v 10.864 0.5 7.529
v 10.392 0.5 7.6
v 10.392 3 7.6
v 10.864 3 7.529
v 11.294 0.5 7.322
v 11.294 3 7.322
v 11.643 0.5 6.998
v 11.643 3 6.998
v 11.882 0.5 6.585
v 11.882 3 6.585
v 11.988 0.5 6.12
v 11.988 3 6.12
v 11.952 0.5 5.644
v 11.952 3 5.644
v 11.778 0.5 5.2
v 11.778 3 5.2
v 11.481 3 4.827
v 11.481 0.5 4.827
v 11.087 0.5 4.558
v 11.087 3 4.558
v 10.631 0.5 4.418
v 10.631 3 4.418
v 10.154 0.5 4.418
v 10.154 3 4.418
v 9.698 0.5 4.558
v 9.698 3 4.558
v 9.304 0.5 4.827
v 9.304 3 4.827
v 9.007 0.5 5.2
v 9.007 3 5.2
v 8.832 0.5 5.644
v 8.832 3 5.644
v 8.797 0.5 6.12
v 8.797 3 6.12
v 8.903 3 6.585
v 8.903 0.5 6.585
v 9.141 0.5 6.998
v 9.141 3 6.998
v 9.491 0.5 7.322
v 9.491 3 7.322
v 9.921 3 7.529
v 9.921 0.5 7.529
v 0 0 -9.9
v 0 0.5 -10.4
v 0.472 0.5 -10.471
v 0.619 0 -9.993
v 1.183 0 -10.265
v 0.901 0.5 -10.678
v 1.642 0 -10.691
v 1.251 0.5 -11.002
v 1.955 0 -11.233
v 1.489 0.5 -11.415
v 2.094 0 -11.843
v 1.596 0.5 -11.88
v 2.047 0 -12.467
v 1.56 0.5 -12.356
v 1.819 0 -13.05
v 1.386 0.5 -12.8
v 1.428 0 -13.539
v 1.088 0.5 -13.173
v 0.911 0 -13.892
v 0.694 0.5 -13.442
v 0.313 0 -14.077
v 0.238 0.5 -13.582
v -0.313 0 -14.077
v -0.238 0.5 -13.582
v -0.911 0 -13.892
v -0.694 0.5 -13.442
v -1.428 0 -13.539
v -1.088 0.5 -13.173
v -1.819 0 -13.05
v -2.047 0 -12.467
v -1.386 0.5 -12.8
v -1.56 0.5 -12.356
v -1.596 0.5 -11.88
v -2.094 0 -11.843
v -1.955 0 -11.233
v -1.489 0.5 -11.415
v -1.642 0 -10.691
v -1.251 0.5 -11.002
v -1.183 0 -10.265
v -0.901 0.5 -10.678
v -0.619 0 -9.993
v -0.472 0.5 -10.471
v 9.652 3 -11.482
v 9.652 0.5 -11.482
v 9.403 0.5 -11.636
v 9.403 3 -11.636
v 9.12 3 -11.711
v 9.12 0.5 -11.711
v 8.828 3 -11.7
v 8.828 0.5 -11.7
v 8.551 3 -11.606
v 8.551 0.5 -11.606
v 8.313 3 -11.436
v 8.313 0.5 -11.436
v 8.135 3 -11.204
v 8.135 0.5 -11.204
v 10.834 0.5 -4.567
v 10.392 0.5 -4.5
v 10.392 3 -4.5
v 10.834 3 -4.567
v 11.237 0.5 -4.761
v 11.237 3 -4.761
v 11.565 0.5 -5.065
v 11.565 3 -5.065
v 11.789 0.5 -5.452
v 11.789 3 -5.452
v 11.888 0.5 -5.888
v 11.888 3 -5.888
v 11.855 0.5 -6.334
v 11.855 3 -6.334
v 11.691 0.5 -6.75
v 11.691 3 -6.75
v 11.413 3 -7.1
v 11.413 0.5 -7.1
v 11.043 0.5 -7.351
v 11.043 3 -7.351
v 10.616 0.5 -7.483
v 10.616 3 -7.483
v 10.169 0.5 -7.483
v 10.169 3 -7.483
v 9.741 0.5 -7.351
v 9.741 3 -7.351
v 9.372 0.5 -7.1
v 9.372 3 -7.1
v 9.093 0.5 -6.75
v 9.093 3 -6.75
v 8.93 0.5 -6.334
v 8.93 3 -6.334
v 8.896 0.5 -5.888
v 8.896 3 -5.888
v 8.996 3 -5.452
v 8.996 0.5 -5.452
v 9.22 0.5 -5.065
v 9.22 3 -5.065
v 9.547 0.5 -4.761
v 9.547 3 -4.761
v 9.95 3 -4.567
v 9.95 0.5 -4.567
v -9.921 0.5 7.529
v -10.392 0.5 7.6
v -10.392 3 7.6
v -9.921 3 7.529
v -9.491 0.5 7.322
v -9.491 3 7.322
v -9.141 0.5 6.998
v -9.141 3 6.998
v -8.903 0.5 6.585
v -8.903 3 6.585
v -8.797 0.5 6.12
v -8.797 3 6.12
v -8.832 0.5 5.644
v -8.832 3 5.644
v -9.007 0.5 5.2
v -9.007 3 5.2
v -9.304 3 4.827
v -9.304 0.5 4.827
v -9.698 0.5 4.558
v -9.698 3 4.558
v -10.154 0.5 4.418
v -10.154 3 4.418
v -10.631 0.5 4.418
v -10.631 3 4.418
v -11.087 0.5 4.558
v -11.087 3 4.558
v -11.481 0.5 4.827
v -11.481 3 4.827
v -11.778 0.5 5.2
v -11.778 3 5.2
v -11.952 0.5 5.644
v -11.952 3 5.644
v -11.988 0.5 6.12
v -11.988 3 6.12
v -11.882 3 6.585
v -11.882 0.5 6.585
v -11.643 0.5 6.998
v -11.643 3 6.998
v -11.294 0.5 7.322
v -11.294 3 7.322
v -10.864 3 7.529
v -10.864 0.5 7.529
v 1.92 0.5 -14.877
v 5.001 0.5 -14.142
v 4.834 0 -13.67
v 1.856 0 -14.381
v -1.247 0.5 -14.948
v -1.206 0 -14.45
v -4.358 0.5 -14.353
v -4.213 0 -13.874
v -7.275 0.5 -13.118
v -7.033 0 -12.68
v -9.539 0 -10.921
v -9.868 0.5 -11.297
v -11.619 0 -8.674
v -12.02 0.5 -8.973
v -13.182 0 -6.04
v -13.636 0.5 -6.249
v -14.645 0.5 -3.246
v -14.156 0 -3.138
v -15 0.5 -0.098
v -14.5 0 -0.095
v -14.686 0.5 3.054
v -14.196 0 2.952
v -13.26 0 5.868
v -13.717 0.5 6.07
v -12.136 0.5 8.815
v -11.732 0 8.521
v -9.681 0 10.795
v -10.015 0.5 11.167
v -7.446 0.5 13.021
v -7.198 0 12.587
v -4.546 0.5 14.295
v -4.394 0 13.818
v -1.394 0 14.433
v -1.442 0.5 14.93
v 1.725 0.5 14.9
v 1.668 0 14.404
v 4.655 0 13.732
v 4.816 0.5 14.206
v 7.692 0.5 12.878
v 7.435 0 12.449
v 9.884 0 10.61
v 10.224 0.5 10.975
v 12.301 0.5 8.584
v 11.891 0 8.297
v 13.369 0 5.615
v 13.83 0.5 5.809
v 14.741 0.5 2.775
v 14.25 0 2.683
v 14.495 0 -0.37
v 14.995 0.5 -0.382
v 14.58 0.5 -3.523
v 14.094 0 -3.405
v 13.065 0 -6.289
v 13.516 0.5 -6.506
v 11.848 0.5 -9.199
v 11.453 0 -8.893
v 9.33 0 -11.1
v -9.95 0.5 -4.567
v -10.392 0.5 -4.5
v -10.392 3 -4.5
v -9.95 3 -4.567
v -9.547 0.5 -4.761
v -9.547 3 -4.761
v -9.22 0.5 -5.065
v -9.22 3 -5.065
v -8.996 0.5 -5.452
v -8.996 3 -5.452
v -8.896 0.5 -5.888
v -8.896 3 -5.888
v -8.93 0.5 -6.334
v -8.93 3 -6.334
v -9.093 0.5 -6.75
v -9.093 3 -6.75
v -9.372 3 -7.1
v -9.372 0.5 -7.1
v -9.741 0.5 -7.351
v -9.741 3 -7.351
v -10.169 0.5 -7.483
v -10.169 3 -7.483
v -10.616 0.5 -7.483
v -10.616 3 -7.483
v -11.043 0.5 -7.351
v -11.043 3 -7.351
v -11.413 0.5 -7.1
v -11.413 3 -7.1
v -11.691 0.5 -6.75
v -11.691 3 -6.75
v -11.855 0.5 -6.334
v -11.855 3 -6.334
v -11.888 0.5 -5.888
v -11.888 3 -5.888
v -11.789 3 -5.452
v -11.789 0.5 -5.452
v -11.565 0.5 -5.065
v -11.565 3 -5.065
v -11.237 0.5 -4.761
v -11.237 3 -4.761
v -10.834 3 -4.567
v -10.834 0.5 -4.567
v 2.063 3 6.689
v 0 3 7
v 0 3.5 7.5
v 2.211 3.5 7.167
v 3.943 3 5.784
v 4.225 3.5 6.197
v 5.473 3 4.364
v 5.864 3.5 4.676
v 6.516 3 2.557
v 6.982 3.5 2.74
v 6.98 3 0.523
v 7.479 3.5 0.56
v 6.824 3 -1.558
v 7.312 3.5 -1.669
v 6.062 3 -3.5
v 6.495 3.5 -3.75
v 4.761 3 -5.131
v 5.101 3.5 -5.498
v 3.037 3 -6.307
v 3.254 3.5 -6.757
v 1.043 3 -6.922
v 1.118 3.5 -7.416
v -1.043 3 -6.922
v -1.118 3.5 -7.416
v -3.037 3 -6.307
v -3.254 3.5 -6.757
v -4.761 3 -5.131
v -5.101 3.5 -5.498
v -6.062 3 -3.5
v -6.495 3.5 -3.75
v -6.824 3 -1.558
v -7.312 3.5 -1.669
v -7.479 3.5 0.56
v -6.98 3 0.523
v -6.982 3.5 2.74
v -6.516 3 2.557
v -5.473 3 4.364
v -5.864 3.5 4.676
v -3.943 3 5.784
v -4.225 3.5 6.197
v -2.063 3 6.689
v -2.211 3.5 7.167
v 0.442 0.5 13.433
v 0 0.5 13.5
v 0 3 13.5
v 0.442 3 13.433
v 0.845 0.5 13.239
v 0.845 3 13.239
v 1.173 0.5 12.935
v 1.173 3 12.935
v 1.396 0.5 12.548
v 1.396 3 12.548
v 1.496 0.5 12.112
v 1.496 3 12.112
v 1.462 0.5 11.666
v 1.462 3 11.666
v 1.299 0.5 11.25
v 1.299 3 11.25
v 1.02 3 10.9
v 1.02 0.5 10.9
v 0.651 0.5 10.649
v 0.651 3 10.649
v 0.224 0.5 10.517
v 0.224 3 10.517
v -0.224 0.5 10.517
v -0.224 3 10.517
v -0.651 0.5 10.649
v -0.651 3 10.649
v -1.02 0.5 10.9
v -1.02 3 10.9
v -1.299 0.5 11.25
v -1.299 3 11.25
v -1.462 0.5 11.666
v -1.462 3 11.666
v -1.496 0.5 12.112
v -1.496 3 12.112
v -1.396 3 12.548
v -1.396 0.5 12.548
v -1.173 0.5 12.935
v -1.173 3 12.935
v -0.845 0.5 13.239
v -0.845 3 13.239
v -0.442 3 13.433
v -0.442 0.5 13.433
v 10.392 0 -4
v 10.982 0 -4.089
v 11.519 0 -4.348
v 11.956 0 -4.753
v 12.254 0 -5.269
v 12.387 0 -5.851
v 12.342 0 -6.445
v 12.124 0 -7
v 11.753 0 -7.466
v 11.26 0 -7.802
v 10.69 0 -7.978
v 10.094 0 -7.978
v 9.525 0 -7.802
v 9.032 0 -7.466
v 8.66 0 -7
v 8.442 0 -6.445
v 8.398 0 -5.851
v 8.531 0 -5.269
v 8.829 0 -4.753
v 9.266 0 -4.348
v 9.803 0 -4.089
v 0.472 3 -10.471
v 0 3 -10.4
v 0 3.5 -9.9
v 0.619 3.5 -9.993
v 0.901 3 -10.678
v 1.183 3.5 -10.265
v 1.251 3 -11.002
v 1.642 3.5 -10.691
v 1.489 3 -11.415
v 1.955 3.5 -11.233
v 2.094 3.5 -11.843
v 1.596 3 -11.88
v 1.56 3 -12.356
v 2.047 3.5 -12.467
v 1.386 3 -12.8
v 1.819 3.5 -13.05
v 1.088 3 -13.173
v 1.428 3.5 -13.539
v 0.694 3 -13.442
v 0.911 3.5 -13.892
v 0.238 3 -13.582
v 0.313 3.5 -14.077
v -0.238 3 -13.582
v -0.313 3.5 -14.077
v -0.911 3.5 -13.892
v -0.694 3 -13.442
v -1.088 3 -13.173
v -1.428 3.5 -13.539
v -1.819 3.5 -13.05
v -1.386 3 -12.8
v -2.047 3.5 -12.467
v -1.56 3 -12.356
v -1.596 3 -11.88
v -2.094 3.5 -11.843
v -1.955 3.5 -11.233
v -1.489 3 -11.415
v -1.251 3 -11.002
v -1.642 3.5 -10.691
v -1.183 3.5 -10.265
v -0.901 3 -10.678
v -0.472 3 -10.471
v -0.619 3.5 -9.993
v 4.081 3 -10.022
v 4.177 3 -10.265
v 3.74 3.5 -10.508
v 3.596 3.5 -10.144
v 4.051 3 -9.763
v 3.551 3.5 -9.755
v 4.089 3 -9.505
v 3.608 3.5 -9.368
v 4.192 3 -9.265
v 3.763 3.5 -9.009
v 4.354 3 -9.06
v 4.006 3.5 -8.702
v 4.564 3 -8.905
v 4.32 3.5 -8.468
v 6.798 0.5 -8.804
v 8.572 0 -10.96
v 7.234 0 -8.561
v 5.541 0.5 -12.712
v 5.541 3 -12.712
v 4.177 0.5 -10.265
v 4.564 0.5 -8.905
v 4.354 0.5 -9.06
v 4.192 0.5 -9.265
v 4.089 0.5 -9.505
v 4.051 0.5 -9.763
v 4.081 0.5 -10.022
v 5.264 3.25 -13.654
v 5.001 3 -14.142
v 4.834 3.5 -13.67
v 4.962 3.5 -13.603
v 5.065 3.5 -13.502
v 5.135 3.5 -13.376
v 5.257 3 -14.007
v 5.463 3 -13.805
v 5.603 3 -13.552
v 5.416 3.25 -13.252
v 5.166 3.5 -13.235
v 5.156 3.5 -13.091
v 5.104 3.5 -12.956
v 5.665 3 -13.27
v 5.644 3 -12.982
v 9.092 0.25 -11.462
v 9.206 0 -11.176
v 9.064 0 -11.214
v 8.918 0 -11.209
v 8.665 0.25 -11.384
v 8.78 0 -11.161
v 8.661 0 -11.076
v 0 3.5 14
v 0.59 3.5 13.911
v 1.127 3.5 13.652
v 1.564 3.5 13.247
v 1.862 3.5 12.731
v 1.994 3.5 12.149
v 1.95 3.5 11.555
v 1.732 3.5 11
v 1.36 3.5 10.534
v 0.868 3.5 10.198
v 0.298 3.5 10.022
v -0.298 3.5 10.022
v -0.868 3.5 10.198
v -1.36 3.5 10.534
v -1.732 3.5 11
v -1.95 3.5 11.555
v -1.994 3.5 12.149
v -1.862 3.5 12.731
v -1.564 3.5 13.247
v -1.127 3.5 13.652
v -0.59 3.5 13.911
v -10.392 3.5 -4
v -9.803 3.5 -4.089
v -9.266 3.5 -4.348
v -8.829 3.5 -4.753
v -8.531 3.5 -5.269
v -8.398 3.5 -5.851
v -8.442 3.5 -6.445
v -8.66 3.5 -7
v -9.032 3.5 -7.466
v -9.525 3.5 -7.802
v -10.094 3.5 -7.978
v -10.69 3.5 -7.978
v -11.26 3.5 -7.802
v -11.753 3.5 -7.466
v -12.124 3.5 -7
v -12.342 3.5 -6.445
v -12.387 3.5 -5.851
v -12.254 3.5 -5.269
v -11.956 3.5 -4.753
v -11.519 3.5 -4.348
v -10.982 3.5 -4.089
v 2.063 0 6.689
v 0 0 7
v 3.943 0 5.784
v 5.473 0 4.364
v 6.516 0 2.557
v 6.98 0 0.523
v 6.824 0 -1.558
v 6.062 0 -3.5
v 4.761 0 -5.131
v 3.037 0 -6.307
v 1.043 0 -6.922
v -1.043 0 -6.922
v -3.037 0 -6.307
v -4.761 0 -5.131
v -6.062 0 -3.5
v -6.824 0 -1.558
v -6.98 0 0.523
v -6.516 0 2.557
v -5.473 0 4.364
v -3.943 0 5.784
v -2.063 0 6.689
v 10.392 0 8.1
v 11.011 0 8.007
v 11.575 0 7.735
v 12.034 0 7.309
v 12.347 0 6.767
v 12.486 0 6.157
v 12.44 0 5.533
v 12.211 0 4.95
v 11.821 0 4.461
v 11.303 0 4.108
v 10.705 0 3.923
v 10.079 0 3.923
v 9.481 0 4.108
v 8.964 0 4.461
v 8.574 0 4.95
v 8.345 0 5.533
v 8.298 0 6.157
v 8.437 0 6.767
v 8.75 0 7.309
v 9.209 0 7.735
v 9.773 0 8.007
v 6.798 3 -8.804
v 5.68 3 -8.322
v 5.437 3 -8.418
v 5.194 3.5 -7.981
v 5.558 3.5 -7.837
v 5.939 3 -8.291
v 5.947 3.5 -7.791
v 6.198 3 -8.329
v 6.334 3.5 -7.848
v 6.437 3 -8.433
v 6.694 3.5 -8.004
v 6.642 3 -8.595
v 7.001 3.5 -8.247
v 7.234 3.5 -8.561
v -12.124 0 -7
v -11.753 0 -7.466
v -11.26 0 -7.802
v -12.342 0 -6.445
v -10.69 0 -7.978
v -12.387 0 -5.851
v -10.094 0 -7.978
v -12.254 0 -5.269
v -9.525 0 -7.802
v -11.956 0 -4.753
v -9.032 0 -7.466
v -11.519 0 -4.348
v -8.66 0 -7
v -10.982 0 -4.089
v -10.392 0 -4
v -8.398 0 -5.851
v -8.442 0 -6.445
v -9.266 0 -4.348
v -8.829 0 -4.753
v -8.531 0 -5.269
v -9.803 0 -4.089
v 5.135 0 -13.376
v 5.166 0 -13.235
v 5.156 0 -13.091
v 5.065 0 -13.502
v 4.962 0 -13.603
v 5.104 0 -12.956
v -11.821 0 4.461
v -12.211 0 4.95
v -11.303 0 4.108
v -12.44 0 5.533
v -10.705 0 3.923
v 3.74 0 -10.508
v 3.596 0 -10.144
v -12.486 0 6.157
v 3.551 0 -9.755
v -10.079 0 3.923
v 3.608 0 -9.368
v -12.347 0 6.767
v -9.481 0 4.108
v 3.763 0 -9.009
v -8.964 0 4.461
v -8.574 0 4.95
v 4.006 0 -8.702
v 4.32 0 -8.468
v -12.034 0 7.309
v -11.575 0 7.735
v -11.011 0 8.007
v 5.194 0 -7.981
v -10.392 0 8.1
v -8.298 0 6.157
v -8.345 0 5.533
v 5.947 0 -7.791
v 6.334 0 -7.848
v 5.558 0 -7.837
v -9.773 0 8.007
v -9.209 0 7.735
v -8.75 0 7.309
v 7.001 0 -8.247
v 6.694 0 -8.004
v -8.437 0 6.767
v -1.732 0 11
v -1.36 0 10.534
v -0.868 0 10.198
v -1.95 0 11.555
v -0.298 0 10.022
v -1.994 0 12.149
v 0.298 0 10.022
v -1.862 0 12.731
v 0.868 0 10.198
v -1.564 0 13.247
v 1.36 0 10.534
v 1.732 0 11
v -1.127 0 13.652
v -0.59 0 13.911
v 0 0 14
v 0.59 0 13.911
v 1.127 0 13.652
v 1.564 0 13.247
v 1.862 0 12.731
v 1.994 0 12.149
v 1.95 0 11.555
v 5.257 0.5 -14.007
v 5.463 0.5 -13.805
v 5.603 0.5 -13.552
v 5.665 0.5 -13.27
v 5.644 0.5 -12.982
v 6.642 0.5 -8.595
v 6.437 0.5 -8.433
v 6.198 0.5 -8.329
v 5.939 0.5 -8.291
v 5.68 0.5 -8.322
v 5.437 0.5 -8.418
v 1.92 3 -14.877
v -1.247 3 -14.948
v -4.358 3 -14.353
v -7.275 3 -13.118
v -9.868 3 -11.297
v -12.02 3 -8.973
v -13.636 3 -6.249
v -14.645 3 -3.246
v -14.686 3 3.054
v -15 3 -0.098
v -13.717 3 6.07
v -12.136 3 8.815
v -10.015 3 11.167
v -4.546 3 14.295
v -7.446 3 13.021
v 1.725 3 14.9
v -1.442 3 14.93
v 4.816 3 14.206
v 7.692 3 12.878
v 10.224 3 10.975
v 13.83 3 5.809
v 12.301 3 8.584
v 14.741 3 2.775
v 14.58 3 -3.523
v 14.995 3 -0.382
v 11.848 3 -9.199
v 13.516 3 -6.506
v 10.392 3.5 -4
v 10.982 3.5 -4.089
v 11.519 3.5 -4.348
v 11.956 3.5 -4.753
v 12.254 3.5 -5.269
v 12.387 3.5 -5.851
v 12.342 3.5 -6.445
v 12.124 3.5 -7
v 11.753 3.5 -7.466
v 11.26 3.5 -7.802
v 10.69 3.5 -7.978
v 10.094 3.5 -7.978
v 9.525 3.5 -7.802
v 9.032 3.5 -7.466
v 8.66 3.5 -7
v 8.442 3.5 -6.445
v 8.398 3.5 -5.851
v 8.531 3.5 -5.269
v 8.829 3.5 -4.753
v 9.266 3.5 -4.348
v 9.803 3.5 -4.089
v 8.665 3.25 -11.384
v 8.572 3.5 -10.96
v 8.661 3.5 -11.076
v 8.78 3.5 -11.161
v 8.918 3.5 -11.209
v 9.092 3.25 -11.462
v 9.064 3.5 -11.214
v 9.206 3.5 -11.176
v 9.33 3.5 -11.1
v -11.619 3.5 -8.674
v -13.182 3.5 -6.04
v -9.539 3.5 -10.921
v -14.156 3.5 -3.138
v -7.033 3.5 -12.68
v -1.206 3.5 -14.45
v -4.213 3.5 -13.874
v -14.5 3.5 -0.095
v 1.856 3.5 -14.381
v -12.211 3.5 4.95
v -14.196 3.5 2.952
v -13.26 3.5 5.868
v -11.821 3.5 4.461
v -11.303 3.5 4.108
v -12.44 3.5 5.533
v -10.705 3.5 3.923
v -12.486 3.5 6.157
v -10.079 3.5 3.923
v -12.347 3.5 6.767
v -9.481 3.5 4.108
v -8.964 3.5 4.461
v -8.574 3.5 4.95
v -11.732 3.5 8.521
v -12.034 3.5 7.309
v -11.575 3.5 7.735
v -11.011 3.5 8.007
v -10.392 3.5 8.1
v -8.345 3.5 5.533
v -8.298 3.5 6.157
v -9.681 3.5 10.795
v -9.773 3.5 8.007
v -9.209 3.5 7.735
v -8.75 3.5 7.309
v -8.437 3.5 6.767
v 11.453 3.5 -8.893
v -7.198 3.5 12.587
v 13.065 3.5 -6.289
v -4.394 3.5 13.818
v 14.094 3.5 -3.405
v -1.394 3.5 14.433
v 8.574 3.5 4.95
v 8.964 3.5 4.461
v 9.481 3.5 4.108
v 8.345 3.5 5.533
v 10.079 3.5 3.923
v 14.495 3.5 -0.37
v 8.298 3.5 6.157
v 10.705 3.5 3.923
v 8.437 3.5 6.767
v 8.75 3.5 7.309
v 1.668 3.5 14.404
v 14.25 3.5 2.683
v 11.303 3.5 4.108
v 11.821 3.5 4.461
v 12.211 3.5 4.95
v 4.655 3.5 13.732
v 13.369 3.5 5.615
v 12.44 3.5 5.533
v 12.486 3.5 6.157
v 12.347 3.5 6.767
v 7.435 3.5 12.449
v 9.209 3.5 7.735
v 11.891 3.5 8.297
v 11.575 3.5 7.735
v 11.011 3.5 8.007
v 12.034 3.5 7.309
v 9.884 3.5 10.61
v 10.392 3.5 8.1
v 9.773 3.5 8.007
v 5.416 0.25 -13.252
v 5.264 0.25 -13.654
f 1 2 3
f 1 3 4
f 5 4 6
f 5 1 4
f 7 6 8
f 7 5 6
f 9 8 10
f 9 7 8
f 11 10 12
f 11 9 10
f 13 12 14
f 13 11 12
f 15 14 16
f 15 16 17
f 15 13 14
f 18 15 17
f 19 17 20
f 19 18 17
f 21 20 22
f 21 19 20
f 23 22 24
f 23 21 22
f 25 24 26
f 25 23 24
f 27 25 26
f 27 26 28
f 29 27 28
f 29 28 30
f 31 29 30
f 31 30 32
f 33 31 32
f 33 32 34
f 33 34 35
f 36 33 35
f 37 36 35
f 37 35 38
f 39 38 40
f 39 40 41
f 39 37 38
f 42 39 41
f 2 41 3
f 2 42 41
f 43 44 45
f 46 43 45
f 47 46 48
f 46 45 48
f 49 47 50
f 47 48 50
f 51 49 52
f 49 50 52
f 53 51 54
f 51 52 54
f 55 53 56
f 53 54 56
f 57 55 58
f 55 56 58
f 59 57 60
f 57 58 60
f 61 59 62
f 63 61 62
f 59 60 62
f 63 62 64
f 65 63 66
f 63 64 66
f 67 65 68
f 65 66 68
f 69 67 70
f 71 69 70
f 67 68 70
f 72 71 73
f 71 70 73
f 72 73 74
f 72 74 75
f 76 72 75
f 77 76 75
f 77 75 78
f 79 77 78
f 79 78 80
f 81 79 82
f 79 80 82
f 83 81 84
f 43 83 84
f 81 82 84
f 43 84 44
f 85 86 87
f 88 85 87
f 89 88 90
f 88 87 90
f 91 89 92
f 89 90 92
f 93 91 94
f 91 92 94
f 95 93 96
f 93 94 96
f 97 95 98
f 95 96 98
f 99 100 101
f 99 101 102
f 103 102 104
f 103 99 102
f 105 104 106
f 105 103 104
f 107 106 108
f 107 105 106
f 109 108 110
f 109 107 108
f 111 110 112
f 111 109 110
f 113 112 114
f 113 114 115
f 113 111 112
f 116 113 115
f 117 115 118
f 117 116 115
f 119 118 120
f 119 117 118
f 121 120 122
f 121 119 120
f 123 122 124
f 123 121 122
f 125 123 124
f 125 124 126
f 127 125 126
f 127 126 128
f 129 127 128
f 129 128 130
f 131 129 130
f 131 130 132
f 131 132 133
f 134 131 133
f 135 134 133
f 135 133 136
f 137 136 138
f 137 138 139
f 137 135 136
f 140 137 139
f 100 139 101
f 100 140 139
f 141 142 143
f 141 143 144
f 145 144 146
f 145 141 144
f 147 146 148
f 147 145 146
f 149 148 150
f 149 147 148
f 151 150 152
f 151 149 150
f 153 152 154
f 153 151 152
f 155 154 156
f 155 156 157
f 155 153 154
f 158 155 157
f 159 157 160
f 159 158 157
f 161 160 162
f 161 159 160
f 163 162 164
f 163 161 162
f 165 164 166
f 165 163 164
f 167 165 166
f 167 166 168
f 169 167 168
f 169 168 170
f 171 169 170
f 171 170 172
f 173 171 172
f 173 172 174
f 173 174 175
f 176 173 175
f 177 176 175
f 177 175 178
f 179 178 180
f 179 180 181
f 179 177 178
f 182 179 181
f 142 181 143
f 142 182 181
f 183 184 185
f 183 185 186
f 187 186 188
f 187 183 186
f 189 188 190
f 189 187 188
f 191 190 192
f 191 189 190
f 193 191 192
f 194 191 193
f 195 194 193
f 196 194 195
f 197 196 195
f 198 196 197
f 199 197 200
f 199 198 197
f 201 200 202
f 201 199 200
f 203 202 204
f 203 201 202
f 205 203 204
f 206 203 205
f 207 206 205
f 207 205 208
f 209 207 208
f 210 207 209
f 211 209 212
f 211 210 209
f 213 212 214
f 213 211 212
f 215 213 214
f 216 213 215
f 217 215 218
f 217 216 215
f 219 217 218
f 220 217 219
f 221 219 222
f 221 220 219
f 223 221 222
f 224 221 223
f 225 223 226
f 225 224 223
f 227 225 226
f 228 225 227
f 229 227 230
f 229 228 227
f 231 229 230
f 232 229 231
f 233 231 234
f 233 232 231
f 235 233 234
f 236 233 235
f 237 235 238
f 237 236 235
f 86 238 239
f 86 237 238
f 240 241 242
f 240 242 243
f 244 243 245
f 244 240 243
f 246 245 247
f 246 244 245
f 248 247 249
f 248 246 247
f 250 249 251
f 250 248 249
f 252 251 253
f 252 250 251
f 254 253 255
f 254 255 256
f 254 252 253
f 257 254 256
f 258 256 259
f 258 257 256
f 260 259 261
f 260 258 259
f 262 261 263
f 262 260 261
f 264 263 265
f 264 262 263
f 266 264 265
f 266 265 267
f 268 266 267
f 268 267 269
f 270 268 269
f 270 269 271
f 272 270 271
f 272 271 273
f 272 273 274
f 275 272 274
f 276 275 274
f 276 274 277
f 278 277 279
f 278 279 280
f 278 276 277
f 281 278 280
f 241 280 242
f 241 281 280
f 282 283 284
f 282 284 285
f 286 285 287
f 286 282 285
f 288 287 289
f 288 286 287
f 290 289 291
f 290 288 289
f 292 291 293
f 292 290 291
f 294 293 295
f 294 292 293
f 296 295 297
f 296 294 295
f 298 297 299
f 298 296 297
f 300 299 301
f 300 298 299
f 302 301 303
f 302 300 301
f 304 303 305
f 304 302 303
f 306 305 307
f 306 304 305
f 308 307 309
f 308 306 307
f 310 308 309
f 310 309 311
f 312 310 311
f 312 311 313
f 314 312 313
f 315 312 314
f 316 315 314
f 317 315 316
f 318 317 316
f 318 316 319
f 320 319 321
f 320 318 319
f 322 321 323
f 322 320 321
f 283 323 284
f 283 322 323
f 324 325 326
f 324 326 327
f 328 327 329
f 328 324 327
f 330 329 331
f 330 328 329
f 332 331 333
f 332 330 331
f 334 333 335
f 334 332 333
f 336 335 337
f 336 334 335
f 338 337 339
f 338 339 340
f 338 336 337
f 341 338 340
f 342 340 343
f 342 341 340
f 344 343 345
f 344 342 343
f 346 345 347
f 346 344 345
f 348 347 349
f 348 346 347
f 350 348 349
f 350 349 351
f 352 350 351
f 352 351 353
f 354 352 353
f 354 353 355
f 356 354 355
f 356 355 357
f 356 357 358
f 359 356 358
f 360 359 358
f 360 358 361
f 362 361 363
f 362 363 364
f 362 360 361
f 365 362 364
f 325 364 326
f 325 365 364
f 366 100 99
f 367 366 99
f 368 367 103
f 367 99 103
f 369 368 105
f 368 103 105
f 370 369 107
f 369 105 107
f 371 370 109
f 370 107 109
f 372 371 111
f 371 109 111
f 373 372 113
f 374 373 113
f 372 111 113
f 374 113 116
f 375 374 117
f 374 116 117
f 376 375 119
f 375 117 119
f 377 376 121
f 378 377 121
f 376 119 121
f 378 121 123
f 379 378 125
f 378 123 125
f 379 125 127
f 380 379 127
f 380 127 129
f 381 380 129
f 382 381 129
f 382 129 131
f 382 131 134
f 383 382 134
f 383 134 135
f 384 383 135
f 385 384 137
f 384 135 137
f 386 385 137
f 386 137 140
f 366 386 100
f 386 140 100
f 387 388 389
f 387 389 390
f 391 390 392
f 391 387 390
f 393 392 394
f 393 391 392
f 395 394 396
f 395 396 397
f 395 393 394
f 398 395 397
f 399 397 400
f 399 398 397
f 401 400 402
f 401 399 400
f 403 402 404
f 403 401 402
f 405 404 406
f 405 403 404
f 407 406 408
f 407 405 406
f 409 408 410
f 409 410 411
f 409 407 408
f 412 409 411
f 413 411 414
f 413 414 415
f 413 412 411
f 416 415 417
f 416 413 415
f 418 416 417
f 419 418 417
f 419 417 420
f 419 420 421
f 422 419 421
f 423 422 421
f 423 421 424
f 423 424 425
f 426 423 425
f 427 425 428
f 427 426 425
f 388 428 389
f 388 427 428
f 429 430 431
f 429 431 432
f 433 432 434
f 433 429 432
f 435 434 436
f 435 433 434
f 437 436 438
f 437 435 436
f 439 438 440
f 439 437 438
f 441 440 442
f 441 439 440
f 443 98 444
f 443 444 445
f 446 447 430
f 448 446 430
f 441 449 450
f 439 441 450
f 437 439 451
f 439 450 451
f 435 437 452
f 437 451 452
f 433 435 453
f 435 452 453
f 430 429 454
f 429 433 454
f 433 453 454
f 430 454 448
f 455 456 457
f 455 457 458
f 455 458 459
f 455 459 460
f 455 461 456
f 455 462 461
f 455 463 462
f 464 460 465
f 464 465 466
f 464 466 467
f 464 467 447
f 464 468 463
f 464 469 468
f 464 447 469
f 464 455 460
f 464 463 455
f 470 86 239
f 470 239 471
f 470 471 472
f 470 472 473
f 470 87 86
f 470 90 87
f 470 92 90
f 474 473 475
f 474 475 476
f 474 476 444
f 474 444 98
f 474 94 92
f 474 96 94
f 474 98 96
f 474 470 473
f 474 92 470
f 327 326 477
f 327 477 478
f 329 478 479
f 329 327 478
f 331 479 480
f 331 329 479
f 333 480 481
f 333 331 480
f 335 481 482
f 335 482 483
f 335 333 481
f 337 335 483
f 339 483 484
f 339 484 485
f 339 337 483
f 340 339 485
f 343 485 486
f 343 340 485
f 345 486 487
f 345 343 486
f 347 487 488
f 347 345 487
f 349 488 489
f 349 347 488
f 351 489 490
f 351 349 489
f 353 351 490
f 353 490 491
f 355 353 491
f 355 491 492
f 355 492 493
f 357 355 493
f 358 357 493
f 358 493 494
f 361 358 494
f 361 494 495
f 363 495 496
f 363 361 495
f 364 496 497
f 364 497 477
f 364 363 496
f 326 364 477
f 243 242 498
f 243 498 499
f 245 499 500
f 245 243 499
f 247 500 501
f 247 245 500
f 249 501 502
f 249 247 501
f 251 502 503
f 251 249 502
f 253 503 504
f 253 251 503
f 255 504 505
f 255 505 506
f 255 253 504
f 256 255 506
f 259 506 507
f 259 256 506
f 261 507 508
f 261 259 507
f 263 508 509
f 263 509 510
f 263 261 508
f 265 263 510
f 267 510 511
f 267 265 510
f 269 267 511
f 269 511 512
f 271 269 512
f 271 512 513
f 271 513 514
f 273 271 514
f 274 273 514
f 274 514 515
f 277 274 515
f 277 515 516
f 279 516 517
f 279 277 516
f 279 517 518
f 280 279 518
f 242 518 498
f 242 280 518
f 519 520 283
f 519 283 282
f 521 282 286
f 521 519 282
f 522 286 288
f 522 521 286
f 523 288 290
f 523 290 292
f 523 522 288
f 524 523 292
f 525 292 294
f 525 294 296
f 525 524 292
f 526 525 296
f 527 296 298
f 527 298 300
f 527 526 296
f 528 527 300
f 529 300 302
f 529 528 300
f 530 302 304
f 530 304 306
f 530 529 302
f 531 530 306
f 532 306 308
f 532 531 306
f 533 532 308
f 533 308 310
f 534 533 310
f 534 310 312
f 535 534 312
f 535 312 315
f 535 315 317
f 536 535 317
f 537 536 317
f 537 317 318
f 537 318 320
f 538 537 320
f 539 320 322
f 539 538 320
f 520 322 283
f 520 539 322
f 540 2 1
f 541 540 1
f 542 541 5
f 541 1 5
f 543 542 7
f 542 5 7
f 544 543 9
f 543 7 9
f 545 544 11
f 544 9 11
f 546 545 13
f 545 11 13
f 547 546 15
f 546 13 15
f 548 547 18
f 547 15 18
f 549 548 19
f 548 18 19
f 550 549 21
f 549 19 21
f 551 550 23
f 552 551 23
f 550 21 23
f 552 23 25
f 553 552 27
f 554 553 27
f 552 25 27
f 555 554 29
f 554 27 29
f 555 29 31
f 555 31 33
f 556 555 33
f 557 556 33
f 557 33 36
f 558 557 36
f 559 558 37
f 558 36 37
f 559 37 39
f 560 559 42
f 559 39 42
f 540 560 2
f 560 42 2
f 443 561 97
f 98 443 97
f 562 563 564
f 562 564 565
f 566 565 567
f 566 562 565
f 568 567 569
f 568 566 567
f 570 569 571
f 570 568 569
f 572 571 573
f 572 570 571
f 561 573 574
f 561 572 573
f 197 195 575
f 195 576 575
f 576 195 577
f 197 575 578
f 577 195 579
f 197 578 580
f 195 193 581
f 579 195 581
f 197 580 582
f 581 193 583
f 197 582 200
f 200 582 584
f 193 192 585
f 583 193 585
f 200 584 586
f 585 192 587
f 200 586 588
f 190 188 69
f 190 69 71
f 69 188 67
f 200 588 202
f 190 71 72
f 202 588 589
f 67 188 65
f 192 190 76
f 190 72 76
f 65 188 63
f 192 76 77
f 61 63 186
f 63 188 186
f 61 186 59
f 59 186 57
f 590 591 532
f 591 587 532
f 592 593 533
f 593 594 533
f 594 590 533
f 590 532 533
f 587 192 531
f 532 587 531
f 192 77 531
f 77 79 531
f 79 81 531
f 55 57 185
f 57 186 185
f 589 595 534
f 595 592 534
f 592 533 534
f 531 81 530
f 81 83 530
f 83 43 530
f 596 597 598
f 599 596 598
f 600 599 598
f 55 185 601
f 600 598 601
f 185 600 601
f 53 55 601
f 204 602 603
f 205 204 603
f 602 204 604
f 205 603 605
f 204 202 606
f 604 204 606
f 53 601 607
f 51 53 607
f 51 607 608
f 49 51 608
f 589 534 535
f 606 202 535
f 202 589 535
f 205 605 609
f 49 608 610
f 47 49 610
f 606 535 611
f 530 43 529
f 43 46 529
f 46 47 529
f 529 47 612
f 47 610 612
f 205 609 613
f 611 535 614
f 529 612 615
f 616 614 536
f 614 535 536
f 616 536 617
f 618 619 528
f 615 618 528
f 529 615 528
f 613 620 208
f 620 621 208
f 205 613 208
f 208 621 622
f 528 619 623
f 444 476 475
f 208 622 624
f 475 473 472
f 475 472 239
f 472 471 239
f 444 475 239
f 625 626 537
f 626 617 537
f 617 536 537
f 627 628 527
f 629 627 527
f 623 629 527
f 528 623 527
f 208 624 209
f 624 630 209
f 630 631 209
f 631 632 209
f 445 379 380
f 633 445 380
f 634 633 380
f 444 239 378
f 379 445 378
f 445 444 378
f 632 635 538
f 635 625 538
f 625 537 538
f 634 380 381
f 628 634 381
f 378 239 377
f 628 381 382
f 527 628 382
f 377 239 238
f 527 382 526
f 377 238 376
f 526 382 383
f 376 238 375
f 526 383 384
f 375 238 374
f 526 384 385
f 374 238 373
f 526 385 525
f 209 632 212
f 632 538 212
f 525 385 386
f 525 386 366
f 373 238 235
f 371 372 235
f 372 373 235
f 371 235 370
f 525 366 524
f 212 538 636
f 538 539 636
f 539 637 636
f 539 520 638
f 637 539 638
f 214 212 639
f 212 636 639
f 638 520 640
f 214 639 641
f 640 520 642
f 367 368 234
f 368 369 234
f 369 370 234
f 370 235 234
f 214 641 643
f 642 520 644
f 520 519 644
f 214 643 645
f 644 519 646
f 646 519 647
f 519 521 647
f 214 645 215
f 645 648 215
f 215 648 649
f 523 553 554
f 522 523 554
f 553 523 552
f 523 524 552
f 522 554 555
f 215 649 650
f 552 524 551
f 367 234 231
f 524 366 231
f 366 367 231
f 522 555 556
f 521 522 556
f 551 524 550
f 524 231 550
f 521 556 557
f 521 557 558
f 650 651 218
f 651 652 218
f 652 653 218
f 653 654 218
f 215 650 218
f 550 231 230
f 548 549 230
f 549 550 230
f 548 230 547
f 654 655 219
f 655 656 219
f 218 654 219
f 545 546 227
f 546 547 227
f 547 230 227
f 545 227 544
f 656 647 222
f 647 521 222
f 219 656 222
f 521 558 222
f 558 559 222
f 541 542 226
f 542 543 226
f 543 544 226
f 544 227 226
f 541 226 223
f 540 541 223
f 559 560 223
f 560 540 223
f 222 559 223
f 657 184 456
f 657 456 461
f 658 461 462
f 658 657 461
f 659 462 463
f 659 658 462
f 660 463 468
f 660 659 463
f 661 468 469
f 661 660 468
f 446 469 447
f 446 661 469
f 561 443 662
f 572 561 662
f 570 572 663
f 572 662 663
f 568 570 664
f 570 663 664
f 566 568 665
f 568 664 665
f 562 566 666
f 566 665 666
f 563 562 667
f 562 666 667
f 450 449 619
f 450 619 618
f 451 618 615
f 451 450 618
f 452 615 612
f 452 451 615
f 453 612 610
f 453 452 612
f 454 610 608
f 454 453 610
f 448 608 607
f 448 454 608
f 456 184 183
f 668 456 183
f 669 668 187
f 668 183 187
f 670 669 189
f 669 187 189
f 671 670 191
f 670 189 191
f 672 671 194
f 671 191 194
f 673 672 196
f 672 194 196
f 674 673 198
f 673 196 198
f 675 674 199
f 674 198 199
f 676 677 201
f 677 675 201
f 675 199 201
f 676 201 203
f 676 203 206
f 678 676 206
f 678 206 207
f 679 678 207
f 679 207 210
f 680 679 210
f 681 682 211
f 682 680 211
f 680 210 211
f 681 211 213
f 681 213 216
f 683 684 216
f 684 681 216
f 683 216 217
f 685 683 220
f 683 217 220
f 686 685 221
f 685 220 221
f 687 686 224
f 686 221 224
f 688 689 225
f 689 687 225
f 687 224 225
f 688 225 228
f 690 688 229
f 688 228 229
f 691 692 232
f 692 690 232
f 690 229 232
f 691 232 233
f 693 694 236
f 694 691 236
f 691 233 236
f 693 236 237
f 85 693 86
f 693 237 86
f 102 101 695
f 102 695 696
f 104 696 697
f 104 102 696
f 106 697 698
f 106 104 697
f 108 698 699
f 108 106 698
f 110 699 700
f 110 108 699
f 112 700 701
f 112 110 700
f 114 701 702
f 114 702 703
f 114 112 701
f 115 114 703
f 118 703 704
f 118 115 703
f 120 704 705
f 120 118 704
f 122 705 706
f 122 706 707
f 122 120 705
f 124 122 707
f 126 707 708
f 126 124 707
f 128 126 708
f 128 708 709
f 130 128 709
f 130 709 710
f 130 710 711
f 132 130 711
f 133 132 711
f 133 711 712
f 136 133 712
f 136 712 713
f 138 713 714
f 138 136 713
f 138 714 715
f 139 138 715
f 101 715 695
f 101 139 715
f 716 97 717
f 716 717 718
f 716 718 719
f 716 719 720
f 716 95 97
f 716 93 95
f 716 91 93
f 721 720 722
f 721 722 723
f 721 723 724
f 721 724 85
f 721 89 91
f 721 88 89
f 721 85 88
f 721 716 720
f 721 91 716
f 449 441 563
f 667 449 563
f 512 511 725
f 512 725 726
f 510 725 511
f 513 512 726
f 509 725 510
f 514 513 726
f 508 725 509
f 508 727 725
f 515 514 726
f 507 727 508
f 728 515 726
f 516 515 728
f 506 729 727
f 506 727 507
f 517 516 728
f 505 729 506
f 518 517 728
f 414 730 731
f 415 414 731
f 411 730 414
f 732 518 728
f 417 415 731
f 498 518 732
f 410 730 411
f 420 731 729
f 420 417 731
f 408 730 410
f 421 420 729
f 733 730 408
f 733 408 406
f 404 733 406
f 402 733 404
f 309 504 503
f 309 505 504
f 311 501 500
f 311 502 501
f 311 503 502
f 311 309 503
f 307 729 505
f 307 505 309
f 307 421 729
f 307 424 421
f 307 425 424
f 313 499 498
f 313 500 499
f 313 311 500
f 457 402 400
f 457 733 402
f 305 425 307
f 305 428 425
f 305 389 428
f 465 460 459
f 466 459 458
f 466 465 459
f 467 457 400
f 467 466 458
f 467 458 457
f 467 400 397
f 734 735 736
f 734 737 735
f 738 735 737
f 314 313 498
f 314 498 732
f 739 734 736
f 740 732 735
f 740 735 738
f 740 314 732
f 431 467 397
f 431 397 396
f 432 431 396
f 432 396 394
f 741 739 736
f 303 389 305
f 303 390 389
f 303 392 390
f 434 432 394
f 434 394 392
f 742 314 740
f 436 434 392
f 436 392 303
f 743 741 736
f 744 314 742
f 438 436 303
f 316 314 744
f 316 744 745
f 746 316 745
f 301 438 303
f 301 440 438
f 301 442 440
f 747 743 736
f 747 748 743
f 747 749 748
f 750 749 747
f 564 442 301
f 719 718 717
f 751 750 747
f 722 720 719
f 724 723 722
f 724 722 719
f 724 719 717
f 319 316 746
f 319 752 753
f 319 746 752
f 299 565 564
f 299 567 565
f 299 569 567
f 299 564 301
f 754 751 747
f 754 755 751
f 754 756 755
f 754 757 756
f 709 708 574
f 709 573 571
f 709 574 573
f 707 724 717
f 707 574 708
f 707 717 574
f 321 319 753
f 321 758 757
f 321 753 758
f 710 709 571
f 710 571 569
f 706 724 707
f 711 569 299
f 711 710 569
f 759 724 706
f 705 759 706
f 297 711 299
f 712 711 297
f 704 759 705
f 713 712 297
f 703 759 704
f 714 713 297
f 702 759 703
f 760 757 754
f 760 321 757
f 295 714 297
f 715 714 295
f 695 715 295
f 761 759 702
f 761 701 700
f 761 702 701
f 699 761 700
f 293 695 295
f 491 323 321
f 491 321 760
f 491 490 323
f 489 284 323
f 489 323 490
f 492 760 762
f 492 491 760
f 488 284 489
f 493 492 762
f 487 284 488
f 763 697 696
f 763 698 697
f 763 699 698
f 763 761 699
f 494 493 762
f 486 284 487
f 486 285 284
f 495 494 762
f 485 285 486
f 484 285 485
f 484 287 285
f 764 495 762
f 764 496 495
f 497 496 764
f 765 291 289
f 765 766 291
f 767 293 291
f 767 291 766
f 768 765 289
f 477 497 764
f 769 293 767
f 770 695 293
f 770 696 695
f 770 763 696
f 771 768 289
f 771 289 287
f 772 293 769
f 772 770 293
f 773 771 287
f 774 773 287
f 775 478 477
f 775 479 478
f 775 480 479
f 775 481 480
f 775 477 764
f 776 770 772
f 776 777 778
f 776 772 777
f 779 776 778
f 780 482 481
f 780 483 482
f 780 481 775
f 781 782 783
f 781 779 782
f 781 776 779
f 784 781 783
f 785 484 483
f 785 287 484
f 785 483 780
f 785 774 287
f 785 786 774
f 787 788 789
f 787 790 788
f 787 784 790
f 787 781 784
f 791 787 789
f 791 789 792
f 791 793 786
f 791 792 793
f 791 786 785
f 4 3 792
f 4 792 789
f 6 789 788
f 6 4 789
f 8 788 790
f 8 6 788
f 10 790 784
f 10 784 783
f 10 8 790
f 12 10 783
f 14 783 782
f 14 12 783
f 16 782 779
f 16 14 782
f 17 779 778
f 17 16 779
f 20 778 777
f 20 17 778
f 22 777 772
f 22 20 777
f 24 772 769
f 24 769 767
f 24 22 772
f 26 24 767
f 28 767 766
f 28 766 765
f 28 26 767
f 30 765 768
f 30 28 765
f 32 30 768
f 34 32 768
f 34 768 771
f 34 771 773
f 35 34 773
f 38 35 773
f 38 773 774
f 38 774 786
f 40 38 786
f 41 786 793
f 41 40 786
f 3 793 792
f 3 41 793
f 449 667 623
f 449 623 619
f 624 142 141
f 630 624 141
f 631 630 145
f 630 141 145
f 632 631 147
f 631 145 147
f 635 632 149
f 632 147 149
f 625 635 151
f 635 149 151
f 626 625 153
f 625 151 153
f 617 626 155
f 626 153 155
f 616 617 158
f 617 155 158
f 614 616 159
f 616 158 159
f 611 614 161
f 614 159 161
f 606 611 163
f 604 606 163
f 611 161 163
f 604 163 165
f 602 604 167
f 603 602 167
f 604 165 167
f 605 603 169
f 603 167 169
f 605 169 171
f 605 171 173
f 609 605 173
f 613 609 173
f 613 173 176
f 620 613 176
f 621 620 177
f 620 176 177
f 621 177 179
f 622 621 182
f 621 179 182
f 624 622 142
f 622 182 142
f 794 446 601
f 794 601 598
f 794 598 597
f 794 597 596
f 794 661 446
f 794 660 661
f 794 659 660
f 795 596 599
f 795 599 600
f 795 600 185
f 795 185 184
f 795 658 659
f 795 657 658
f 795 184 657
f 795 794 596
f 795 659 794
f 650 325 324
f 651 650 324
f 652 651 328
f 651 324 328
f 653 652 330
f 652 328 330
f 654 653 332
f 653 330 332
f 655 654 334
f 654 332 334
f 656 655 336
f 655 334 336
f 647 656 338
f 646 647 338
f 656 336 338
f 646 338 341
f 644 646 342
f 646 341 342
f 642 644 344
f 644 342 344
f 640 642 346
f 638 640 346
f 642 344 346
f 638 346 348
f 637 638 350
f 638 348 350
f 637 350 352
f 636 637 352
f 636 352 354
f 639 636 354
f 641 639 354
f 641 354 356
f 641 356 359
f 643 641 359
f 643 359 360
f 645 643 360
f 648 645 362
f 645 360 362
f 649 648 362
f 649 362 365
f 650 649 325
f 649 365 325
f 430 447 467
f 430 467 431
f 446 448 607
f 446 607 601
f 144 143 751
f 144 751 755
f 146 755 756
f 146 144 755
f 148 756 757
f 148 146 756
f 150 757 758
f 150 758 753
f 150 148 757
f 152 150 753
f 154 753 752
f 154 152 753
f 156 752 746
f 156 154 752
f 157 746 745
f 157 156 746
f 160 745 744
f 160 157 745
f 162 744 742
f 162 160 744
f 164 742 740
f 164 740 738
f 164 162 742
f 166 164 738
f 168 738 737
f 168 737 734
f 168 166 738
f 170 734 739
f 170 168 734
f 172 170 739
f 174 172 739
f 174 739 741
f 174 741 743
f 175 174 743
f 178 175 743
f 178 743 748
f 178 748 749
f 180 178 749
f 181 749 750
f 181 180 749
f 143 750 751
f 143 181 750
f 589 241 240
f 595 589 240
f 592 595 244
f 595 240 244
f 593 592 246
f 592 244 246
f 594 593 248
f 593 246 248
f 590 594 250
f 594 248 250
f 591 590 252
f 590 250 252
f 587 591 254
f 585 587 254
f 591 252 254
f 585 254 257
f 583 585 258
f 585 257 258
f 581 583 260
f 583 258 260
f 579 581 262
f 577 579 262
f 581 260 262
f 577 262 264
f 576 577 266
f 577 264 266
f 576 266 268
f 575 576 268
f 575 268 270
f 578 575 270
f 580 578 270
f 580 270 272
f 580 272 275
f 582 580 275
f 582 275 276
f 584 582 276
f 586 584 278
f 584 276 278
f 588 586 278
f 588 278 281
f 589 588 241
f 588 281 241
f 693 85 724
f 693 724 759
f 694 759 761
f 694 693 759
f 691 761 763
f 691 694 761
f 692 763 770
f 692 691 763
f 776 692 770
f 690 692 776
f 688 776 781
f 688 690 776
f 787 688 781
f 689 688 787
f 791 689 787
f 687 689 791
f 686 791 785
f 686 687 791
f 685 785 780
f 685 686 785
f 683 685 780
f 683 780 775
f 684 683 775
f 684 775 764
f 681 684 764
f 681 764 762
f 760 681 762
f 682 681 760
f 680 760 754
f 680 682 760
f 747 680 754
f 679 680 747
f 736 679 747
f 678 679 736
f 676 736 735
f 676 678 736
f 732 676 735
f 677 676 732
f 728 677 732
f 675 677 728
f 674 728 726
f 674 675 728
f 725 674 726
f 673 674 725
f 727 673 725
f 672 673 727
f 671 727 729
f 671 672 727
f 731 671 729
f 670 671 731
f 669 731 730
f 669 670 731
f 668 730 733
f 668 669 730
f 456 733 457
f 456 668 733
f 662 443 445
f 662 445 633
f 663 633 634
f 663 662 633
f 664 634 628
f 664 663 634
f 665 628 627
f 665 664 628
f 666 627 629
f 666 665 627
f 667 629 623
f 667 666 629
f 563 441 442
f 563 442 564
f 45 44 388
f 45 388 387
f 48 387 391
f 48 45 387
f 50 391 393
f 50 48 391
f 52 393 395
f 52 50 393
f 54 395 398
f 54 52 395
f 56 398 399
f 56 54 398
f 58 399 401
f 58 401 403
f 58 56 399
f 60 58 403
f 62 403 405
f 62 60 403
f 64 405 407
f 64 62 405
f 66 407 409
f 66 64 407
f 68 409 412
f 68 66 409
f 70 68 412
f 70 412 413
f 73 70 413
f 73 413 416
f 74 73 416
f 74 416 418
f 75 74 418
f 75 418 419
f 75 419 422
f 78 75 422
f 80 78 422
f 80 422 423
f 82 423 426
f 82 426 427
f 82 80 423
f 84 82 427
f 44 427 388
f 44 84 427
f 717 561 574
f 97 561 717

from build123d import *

# Parameters (mm, degrees)
SKETCH_1_R          = 15
SKETCH_1_R_2        = 1.6
SKETCH_1_R_3        = 1.5
SKETCH_1_R_4        = 7
EXTRUDE_1_DEPTH     = 3.5
CUT_EXTRUDE_1_DEPTH = 8
FILLET_1_R          = 1
FILLET_2_R          = 1
CHAMFER_1_SIZE      = 0.5


with BuildPart() as part:
    # 草图1 → 凸台-拉伸1 (new body)
    with BuildSketch(Plane(origin=(0, 0, 0), x_dir=(1, 0, 0), z_dir=(0, 1, 0))):
        with Locations(Location((0, 0, 0), (0, 0, 270))):
            Circle(SKETCH_1_R)
        with Locations(Location((0, 12, 0), (0, 0, 270))):
            Circle(SKETCH_1_R_2, mode=Mode.SUBTRACT)
        with Locations(Location((10.392304845, -6, 0), (0, 0, 270))):
            Circle(SKETCH_1_R_2, mode=Mode.SUBTRACT)
        with Locations(Location((-10.392304845, -6, 0), (0, 0, 270))):
            Circle(SKETCH_1_R_2, mode=Mode.SUBTRACT)
        with Locations(Location((10.392304845, 6, 0), (0, 0, 270))):
            Circle(SKETCH_1_R_3, mode=Mode.SUBTRACT)
        with Locations(Location((0, -12, 0), (0, 0, 270))):
            Circle(SKETCH_1_R_3, mode=Mode.SUBTRACT)
        with Locations(Location((-10.392304845, 6, 0), (0, 0, 270))):
            Circle(SKETCH_1_R_3, mode=Mode.SUBTRACT)
        with Locations(Location((0, 0, 0), (0, 0, 270))):
            Circle(SKETCH_1_R_4, mode=Mode.SUBTRACT)
    extrude(amount=EXTRUDE_1_DEPTH)

    # 草图2 → 切除-拉伸1 (cut)
    with BuildSketch(Plane(origin=(0, 3.5, 0), x_dir=(1, 0, 0), z_dir=(0, 1, 0))):
        Polygon((3.690349309, 9.391530065), (6.310792277, 7.930955296), (9.125758213, 12.981335358), (6.505315246, 14.441910127), align=None)
    extrude(amount=-CUT_EXTRUDE_1_DEPTH, mode=Mode.SUBTRACT)

    # 圆角1
    fillet_1_edges = [part.edges().sort_by_distance(p)[0] for p in [
        (8.700707091, 1.75, -12.218743639),
        (6.095052455, 1.75, -13.705850414),
    ]]
    fillet(fillet_1_edges, radius=FILLET_1_R)

    # 圆角2
    fillet_2_edges = [part.edges().sort_by_distance(p)[0] for p in [
        (6.310792277, 1.75, -7.930955296),
        (3.690349309, 1.75, -9.391530065),
    ]]
    fillet(fillet_2_edges, radius=FILLET_2_R)

    # 倒角1
    chamfer_1_edges = [part.edges().sort_by_distance(p)[0] for p in [
        (10.392304845, 0, 4.4),
        (10.392304845, 3.5, 4.4),
        (-10.392304845, 0, 4.4),
        (-10.392304845, 3.5, 4.4),
        (0, 3.5, -7),
        (0, 0, 10.5),
        (0, 3.5, 10.5),
        (-10.392304845, 0, -7.5),
        (-10.392304845, 3.5, -7.5),
        (0, 0, -13.6),
        (0, 3.5, -13.6),
        (-7.446160806, 3.5, 13.021316725),
        (-7.446160806, 0, 13.021316725),
        (4.859185687, 3.5, -11.488560036),
        (5.603157458, 3.5, -13.552361106),
        (8.827728967, 3.5, -11.700311046),
        (4.859185687, 0, -11.488560036),
        (5.603157458, 0, -13.552361106),
        (8.827728967, 0, -11.700311046),
        (7.466276221, 3.5, -10.004029432),
        (7.466276221, 0, -10.004029432),
        (5.000570793, 3.5, -8.661242681),
        (5.000570793, 0, -8.661242681),
        (6.1975531, 3.5, -8.329389436),
        (6.1975531, 0, -8.329389436),
        (4.08878345, 3.5, -9.504769242),
        (4.08878345, 0, -9.504769242),
        (10.392304845, 0, -7.5),
        (10.392304845, 3.5, -7.5),
    ]]
    chamfer(chamfer_1_edges, length=CHAMFER_1_SIZE)


solid = part.part
